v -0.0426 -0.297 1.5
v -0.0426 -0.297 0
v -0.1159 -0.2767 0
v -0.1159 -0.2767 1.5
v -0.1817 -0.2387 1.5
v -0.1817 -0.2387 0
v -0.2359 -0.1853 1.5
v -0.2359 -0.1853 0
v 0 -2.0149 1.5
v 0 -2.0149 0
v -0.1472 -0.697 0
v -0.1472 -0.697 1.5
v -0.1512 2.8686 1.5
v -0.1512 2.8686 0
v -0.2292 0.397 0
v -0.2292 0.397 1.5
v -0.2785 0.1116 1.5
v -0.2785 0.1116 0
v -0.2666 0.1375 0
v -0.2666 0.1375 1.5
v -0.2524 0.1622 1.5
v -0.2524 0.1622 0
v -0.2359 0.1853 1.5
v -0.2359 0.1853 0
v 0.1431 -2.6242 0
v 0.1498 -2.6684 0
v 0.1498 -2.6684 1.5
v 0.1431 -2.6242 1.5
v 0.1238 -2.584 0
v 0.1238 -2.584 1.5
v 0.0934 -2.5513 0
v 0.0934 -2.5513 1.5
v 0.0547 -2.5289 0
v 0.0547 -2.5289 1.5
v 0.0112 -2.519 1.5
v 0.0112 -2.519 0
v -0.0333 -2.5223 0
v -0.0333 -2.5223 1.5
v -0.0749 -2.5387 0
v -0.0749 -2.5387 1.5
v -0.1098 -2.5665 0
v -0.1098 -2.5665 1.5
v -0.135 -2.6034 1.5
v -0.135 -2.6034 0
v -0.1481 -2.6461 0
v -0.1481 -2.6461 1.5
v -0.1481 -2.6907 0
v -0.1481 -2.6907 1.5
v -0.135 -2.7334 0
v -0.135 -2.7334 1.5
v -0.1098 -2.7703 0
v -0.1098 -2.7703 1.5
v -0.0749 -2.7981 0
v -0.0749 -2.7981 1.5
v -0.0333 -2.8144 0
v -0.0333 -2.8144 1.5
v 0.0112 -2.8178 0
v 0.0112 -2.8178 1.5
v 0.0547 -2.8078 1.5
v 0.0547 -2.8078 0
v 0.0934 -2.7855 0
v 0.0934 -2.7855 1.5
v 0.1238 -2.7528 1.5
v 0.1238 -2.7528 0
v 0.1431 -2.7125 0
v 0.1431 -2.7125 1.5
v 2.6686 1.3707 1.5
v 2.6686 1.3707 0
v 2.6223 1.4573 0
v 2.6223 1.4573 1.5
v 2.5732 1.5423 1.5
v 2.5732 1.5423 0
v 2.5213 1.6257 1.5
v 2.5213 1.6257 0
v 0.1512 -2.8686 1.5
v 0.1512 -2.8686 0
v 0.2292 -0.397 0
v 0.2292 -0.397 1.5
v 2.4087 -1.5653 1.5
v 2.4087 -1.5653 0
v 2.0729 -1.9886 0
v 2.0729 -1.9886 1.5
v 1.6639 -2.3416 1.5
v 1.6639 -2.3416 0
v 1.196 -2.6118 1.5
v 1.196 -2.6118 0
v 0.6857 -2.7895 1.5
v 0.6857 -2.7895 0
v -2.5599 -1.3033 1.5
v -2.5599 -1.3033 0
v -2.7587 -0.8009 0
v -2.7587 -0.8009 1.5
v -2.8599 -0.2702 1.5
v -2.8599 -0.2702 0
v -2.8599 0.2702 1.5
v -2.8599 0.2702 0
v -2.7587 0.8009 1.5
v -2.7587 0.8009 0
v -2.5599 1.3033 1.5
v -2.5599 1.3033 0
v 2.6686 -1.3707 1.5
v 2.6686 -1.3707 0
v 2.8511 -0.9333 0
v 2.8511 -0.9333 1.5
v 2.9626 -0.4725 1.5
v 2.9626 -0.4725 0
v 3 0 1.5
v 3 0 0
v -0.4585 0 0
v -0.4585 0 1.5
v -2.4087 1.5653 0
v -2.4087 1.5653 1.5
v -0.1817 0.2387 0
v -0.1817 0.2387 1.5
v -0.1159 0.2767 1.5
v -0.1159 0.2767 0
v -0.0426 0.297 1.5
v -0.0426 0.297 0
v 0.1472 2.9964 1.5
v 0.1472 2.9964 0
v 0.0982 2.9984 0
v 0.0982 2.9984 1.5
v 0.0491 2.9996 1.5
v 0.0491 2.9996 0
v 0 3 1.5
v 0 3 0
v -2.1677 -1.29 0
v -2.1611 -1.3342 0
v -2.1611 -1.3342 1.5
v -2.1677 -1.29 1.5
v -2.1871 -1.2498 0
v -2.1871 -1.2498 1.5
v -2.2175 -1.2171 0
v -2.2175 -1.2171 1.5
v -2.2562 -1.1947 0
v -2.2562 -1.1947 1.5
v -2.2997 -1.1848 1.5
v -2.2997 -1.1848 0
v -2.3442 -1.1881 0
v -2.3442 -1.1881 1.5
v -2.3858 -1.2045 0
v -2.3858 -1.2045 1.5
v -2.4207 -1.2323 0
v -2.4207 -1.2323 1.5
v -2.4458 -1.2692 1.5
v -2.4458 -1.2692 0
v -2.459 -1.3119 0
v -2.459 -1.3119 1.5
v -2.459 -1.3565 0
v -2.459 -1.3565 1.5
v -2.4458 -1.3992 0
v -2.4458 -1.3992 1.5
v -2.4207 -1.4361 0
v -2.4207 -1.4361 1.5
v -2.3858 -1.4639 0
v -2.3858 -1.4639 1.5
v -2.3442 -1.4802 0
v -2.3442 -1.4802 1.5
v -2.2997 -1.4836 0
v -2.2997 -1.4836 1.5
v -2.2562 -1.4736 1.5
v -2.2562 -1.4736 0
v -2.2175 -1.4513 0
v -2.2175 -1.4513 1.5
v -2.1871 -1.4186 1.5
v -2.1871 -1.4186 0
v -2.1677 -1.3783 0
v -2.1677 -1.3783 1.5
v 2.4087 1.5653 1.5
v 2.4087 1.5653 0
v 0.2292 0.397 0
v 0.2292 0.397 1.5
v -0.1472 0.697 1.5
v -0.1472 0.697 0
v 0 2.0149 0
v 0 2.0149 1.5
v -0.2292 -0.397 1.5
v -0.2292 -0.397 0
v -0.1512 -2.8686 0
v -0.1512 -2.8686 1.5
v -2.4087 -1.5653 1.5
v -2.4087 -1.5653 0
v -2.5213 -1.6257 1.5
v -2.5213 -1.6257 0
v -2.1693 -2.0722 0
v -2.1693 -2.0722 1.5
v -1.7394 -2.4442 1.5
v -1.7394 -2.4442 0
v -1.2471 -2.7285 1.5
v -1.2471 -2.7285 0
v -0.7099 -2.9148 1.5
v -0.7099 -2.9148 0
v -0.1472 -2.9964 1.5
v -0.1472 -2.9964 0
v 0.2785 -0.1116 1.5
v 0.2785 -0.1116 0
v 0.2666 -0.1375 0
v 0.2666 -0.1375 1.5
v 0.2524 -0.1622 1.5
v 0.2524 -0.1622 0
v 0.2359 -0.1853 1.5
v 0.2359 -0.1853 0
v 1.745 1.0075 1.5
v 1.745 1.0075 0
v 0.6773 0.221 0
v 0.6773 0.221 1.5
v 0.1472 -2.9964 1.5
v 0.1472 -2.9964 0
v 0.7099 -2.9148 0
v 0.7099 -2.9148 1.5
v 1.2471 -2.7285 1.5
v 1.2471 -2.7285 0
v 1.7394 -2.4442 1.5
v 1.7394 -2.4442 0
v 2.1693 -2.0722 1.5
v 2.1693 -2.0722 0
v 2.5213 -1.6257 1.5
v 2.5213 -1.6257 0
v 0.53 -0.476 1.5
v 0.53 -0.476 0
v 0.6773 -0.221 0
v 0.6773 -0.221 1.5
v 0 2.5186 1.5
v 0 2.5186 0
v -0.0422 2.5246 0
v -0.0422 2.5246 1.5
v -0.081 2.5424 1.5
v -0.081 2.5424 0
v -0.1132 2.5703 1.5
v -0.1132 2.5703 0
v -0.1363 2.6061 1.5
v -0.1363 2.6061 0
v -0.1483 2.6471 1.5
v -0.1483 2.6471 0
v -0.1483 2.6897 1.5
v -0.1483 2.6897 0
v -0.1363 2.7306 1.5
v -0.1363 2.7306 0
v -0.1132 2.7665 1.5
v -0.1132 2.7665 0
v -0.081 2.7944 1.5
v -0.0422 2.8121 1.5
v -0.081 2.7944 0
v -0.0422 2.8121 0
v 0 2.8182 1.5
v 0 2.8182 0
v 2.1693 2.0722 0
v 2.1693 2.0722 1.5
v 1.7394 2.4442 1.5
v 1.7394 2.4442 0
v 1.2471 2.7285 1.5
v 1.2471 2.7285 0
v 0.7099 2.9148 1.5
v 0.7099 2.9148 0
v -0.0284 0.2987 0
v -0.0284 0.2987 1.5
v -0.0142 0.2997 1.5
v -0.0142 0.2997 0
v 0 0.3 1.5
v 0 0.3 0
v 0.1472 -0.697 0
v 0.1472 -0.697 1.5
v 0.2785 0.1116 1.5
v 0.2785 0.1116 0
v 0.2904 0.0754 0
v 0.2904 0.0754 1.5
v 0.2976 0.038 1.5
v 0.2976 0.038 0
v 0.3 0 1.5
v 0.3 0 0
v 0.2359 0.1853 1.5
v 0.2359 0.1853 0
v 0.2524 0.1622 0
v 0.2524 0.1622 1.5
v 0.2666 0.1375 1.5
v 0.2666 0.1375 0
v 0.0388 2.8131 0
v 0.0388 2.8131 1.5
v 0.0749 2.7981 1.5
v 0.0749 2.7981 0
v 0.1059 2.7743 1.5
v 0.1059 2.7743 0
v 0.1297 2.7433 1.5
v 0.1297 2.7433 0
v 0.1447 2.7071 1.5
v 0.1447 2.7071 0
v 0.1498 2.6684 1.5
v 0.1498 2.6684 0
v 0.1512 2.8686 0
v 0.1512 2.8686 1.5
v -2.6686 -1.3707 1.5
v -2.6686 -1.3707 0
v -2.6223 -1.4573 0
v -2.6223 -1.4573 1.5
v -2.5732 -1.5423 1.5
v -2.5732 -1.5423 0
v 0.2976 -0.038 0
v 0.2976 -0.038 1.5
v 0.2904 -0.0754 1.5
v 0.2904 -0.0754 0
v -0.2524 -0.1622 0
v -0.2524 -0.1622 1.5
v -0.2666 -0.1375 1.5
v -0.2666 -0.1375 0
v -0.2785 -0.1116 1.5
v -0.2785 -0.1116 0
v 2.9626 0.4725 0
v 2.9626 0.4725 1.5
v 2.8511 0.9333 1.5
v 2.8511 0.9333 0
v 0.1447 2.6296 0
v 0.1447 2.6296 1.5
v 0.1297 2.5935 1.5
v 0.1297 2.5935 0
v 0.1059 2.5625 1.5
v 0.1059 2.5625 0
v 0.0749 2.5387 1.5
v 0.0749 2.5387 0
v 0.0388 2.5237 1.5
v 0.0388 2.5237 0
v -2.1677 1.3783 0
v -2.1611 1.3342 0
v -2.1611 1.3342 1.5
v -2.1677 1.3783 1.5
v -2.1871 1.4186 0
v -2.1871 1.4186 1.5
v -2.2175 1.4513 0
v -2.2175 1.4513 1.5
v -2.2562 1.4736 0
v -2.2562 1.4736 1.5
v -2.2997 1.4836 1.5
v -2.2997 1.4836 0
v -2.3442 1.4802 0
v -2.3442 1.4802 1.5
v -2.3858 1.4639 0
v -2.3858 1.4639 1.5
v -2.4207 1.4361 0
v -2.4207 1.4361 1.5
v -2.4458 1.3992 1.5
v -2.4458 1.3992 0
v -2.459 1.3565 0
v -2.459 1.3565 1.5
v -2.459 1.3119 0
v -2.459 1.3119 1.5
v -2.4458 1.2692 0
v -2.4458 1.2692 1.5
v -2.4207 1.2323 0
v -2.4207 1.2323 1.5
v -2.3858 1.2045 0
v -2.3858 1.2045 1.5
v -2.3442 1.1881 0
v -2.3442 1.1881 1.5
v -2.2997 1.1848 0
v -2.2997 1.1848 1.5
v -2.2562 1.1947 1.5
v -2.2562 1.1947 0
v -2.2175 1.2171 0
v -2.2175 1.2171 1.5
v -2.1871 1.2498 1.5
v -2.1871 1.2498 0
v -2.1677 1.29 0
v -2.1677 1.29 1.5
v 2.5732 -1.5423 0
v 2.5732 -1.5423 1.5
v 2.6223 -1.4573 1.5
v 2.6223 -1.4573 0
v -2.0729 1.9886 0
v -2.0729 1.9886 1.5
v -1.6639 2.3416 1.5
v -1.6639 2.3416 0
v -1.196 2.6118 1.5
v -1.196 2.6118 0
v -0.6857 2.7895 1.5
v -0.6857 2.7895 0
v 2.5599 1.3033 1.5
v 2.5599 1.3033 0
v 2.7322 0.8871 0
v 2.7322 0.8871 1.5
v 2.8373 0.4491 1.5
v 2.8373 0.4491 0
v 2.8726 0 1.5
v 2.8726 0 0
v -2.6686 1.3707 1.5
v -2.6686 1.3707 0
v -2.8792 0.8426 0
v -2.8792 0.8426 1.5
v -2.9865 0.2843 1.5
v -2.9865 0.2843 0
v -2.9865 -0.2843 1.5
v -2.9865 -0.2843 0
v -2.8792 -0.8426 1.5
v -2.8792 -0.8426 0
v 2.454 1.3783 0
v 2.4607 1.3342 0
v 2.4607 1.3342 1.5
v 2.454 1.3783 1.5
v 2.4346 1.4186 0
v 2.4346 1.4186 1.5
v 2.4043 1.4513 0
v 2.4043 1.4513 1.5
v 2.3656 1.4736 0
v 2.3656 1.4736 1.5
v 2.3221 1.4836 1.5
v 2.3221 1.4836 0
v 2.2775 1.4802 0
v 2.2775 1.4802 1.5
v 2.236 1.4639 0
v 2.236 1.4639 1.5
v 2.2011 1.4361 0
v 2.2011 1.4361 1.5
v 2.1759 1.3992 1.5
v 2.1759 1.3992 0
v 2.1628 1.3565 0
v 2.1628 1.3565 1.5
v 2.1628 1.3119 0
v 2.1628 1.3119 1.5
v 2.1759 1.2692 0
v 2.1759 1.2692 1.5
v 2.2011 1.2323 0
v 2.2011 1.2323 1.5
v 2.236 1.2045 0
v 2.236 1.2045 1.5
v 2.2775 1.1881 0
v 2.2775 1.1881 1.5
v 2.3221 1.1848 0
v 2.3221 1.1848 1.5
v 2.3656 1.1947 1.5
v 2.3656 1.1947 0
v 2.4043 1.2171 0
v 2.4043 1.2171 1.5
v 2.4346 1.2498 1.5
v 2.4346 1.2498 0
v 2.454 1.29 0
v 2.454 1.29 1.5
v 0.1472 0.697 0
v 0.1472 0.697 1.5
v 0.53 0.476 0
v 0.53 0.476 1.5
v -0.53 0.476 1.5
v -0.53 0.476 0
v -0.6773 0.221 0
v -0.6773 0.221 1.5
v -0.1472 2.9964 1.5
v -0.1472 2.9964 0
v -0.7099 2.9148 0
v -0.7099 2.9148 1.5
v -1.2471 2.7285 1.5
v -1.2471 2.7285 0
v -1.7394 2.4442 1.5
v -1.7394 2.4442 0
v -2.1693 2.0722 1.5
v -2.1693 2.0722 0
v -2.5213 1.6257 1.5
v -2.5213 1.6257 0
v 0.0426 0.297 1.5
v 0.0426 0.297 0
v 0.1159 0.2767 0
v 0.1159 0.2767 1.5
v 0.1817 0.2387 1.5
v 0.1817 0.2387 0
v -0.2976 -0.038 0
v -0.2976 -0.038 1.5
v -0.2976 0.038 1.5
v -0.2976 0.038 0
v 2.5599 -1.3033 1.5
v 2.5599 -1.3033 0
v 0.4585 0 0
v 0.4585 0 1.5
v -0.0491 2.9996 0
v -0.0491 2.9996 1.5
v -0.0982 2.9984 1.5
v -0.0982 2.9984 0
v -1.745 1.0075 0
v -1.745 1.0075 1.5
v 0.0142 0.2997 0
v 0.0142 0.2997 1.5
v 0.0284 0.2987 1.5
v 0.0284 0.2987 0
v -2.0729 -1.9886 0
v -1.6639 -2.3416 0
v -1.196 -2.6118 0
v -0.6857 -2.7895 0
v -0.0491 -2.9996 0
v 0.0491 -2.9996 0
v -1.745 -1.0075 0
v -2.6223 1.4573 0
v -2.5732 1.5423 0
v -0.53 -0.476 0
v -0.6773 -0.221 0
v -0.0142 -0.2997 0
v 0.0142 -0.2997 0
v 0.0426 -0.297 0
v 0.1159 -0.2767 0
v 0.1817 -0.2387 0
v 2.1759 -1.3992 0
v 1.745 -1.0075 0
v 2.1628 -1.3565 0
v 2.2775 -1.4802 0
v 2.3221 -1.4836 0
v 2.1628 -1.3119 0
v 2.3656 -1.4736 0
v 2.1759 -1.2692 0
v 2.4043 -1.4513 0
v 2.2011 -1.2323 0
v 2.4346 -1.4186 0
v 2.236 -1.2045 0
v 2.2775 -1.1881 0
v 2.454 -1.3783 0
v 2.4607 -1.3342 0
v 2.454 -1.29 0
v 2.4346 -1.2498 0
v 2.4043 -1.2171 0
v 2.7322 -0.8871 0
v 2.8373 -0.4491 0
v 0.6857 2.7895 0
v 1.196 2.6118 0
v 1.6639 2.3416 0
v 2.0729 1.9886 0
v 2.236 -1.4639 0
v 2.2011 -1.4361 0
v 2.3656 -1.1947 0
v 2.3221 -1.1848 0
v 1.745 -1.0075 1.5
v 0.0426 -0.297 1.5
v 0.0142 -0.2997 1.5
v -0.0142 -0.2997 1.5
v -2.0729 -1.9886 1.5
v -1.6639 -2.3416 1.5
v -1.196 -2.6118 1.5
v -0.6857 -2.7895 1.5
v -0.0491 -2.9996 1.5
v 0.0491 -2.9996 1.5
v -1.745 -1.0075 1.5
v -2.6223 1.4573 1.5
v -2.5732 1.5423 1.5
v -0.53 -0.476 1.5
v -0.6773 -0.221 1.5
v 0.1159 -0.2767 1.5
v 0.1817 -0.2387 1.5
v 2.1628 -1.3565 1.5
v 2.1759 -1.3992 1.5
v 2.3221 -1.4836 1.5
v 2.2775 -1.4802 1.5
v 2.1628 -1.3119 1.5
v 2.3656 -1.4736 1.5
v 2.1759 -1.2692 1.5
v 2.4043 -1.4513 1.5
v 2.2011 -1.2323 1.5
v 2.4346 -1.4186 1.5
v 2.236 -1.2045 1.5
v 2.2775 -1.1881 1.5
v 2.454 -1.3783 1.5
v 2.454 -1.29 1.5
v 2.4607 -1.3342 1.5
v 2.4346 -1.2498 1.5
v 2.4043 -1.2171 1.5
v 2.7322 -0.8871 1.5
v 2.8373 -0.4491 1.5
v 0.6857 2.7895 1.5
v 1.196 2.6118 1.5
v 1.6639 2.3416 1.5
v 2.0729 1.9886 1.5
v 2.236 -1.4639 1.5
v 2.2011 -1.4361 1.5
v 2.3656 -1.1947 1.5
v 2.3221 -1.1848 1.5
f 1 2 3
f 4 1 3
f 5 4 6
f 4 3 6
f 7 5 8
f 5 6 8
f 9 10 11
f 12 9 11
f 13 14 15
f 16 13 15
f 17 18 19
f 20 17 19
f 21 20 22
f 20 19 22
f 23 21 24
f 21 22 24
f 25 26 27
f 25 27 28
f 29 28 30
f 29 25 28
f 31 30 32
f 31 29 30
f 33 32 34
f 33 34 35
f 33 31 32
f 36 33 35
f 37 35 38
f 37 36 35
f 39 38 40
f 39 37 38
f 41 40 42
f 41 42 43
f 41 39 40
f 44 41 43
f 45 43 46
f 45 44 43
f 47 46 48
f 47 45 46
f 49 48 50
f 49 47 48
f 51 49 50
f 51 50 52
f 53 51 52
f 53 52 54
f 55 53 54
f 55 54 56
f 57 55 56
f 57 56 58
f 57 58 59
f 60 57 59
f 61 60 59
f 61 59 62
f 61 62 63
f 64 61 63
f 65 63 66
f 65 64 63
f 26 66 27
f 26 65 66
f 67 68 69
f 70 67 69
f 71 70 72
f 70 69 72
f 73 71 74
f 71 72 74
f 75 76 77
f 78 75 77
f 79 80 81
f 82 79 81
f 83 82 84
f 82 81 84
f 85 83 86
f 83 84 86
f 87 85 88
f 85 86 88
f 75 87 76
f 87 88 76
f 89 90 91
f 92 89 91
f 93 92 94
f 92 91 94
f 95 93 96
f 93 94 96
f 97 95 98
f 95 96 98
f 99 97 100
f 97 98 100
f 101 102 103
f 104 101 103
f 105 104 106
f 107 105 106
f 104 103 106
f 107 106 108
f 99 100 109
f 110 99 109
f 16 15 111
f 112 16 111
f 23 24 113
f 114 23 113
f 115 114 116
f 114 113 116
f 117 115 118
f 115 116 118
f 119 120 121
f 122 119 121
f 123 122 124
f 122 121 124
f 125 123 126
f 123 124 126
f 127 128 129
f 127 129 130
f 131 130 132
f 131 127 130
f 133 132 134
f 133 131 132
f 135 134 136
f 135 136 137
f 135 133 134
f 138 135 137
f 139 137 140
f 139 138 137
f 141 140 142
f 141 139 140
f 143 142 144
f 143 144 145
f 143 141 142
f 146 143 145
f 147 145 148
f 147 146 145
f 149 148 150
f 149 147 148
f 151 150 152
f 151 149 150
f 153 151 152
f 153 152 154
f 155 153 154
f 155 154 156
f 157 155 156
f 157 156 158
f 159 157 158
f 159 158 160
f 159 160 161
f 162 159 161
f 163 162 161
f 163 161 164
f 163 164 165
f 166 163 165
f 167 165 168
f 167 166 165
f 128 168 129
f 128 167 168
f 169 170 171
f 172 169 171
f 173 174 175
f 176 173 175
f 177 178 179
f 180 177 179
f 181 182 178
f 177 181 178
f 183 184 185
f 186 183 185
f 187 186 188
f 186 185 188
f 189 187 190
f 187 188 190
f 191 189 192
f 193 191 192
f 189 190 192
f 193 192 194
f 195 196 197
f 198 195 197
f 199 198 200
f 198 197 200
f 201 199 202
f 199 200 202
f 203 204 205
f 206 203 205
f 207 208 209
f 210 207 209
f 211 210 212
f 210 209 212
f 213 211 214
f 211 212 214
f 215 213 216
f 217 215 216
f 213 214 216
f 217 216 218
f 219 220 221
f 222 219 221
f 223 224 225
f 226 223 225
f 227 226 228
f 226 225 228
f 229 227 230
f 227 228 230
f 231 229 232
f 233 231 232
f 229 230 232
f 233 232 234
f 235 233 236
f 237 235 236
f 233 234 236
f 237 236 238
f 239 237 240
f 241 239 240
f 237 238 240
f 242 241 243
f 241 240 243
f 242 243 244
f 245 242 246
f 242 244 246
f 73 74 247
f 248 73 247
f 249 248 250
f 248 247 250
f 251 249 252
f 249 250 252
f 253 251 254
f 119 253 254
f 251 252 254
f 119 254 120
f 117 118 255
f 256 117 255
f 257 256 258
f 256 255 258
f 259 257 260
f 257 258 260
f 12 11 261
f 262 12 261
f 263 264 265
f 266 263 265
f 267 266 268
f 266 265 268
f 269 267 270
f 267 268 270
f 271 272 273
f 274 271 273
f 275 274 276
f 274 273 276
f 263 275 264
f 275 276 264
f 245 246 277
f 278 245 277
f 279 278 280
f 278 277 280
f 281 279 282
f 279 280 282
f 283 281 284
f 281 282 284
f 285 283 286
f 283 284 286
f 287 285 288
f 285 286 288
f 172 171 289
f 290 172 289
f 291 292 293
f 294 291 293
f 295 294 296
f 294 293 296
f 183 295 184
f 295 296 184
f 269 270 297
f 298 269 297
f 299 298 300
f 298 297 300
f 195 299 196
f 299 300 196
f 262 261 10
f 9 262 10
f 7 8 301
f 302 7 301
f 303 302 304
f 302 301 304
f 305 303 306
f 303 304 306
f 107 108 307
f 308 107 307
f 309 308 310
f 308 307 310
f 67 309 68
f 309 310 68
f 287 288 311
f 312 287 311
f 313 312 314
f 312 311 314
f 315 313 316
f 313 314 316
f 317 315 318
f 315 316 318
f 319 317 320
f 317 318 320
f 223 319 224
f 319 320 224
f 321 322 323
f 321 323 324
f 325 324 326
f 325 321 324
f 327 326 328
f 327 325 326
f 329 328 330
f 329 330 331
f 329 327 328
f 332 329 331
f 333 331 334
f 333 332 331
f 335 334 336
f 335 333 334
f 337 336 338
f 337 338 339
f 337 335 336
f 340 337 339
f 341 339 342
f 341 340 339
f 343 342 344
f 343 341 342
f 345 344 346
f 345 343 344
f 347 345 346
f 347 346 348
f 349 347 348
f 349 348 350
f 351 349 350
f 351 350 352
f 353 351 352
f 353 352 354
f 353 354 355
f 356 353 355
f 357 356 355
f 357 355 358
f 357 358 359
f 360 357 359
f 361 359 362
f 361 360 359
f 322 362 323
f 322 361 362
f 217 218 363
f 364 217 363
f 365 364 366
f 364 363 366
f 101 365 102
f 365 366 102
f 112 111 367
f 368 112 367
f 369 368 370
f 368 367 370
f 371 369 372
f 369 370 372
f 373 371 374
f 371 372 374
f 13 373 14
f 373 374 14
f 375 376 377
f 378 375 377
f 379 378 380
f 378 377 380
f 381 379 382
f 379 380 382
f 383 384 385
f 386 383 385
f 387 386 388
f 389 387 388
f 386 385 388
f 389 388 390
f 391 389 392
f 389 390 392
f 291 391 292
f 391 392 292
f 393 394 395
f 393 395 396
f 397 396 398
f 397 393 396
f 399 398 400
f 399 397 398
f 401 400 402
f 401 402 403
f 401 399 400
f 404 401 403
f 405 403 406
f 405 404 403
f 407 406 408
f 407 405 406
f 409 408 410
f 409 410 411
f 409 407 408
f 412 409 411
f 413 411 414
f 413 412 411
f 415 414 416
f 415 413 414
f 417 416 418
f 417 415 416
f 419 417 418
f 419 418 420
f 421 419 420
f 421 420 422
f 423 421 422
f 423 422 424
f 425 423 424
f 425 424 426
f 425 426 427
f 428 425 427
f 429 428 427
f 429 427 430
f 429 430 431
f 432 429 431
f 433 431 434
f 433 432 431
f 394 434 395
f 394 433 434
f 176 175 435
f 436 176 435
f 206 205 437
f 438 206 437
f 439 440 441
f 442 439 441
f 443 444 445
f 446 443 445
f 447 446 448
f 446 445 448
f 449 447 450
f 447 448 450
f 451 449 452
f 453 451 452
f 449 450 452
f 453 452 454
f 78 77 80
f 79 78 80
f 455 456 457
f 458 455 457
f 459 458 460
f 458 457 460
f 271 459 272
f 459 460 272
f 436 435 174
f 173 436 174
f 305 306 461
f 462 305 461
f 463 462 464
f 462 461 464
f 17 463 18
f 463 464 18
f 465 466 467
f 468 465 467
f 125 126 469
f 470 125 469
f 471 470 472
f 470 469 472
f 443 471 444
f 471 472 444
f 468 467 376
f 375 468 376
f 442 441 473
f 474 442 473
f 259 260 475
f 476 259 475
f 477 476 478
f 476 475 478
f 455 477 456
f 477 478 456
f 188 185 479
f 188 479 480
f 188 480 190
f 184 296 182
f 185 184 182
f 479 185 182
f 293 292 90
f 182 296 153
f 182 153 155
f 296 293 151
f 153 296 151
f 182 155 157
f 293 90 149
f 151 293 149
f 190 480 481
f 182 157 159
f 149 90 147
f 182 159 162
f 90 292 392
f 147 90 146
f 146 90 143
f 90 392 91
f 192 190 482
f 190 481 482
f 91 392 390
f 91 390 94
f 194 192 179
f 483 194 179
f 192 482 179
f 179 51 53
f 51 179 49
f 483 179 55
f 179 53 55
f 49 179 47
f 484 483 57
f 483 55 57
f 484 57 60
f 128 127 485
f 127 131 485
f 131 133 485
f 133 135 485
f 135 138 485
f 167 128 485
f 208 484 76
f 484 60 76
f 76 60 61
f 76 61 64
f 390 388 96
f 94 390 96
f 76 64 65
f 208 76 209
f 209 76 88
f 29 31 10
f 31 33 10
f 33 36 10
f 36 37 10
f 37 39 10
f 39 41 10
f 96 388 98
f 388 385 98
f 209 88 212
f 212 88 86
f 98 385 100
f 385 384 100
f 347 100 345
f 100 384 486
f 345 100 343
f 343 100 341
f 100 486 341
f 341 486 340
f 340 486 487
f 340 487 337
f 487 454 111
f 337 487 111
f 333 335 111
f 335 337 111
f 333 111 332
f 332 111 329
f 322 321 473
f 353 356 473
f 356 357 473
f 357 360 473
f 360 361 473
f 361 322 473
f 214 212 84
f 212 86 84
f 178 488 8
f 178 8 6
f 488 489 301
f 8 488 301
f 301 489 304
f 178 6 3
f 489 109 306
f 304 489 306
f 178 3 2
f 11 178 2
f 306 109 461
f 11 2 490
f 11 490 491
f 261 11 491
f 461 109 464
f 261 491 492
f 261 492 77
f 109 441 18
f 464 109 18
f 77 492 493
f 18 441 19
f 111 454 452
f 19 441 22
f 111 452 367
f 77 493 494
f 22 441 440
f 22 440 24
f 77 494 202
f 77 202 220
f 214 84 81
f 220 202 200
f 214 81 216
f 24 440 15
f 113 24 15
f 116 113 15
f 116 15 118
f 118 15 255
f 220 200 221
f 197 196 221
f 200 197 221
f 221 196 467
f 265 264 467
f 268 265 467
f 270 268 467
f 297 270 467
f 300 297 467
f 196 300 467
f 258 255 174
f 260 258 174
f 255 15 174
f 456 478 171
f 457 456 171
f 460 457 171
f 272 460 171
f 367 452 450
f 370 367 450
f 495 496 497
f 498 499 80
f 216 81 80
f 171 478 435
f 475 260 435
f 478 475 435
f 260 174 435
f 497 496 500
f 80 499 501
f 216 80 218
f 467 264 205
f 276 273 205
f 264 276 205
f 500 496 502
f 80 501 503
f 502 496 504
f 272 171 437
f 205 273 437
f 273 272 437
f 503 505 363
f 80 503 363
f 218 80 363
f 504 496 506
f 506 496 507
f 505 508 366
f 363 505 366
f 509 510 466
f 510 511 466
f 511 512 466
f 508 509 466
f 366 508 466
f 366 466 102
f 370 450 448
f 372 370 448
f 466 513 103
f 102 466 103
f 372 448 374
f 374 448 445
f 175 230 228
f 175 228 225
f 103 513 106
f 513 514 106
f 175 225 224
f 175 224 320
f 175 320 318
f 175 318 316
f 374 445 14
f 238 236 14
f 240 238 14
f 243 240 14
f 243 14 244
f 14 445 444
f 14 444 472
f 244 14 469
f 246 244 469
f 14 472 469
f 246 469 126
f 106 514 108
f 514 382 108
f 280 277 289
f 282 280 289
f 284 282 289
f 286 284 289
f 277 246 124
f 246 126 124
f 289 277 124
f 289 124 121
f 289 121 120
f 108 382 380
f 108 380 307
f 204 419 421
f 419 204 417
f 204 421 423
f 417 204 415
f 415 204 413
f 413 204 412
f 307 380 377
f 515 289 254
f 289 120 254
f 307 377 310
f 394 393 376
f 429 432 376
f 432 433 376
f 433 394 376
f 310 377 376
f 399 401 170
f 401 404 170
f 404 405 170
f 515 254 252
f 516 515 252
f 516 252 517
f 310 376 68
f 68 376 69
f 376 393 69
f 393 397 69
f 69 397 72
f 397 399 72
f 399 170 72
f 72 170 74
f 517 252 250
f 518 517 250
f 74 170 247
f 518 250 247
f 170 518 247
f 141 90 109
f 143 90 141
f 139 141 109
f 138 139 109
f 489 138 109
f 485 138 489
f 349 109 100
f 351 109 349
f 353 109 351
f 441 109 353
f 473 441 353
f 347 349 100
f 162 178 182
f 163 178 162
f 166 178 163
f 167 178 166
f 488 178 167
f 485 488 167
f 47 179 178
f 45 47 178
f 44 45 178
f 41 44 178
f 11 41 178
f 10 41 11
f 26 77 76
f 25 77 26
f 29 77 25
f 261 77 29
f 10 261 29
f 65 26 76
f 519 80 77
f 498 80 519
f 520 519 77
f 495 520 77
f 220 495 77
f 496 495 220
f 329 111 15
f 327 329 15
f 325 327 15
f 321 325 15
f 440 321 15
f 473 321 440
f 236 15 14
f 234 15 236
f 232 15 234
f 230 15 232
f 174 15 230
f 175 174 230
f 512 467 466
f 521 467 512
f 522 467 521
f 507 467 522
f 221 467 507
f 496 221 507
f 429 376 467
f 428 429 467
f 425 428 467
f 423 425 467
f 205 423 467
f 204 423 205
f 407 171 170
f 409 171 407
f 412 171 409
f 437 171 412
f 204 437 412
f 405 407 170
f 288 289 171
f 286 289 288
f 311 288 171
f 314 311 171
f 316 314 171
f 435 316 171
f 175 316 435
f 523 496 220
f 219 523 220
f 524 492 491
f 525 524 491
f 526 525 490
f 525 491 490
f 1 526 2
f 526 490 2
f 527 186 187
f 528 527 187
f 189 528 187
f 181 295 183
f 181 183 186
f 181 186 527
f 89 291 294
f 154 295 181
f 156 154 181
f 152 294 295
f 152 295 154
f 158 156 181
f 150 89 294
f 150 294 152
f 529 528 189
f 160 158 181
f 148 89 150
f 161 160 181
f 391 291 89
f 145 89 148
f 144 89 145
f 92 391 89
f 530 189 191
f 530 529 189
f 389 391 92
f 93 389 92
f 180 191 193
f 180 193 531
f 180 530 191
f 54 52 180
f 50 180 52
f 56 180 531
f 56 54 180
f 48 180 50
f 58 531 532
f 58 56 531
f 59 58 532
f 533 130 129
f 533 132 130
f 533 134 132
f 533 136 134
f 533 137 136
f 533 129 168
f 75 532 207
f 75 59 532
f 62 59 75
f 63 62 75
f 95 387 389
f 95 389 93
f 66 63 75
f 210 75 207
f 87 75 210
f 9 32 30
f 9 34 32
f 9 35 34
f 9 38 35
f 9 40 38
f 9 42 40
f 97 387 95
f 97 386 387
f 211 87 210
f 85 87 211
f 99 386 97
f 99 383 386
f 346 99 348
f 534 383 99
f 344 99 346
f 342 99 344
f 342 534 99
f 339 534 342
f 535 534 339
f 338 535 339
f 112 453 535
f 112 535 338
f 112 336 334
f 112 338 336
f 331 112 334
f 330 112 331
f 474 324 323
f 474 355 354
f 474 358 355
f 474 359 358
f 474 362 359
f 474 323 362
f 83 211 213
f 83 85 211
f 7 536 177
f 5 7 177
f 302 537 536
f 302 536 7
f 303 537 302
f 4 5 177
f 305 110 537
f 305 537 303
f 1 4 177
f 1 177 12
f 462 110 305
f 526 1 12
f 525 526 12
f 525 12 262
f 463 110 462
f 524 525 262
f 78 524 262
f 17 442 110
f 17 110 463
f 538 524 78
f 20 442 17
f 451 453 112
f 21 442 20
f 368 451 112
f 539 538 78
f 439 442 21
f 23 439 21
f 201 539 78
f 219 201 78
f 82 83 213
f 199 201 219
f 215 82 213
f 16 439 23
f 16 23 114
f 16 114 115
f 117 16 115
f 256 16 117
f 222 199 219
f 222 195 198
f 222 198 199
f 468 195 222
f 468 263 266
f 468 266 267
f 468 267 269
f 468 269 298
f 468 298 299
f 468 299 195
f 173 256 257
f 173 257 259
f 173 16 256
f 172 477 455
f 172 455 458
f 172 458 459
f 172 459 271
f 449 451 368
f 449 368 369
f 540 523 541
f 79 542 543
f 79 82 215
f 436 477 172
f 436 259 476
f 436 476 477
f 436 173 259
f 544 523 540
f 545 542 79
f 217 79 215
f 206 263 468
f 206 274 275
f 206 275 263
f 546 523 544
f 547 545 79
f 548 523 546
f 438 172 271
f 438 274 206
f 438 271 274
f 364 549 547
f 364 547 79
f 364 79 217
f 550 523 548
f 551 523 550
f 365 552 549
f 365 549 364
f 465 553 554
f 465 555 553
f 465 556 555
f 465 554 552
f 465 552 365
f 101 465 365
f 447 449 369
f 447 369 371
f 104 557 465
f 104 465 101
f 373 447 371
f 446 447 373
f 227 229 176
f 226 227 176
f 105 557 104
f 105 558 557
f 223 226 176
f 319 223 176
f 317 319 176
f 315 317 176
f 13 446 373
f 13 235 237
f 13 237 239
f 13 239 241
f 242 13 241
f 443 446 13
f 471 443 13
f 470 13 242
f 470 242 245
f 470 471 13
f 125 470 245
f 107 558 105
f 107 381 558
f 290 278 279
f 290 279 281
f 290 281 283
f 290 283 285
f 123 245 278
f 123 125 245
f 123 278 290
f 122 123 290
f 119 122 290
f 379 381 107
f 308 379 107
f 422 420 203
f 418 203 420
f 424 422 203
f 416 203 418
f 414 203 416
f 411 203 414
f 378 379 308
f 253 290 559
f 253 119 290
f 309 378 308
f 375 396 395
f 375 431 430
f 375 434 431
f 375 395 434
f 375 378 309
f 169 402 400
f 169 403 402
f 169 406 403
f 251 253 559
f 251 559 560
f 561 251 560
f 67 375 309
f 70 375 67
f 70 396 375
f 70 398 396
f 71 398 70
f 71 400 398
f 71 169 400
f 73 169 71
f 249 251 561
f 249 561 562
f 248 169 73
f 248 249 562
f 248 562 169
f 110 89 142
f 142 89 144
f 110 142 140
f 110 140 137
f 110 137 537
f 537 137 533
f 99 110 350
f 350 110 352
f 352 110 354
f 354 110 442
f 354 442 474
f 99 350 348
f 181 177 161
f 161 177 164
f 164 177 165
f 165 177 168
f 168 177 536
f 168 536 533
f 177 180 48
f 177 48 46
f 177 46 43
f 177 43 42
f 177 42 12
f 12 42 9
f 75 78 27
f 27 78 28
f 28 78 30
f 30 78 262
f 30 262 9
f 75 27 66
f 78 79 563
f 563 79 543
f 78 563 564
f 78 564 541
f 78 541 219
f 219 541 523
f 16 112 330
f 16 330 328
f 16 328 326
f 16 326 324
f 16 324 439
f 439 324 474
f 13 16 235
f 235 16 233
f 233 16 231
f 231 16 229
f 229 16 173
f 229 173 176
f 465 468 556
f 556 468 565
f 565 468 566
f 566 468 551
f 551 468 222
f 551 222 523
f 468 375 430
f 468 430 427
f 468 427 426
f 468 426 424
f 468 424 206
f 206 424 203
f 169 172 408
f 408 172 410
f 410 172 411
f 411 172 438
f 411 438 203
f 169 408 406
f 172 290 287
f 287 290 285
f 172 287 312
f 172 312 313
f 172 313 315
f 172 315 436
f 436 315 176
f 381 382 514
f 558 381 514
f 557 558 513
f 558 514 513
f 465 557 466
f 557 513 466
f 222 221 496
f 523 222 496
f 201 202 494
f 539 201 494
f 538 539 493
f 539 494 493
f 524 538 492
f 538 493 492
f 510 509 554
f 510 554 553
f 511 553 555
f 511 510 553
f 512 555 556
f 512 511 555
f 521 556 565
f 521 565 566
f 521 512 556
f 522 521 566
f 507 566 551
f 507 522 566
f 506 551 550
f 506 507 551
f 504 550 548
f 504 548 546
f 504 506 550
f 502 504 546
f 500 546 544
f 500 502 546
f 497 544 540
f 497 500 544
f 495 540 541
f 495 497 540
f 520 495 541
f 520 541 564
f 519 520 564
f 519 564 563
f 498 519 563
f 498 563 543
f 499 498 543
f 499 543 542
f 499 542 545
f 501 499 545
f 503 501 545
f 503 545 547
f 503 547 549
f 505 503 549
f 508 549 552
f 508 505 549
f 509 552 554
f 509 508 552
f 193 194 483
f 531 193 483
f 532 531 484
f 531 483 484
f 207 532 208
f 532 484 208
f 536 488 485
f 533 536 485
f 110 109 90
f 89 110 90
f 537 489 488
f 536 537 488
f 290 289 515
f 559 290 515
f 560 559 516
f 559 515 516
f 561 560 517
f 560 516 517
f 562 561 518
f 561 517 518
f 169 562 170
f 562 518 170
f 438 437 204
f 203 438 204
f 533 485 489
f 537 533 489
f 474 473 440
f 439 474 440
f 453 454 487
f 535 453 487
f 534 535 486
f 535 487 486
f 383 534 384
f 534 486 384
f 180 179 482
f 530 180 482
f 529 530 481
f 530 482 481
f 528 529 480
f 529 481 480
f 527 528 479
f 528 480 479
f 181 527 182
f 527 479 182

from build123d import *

# Parameters (mm, degrees)
SKETCH1_R           = 0.14979499
BOSS_EXTRUDE1_DEPTH = 1.5


with BuildPart() as part:
    # Sketch1 → Boss-Extrude1 (new body)
    # profile 1 of 26: a face of its own
    with BuildSketch(Plane.XY):
        with BuildLine():
            Line((-0.151247724, 2.868610652), (-0.147216387, 2.996385712))
            ThreePointArc((-0.147216387, 2.996385712), (-1.5, 2.598076211), (-2.521337953, 1.625685987))
            Line((-2.521337953, 1.625685987), (-2.408665836, 1.565289697))
            ThreePointArc((-2.408665836, 1.565289697), (-1.436297579, 2.487740382), (-0.151247724, 2.868610652))
        make_face()
    # profile 2 of 26: a face of its own
    with BuildSketch(Plane.XY):
        with BuildLine():
            Line((0, 2.872595159), (0, 3))
            ThreePointArc((0, 3), (-0.073630374, 2.999096292), (-0.147216387, 2.996385712))
            Line((-0.147216387, 2.996385712), (-0.151247724, 2.868610652))
            ThreePointArc((-0.151247724, 2.868610652), (-0.0756501, 2.871598859), (0, 2.872595159))
        make_face()
    # profile 3 of 26: a face of its own
    with BuildSketch(Plane.XY):
        with BuildLine():
            ThreePointArc((0.147216387, 2.996385712), (0.073630374, 2.999096292), (0, 3))
            Line((0, 3), (0, 2.872595159))
            ThreePointArc((0, 2.872595159), (0.0756501, 2.871598859), (0.151247724, 2.868610652))
            Line((0.151247724, 2.868610652), (0.147216387, 2.996385712))
        make_face()
    # profile 4 of 26: a face of its own
    with BuildSketch(Plane.XY):
        with BuildLine():
            ThreePointArc((2.521337953, 1.625685987), (1.5, 2.598076211), (0.147216387, 2.996385712))
            Line((0.147216387, 2.996385712), (0.151247724, 2.868610652))
            ThreePointArc((0.151247724, 2.868610652), (1.436297579, 2.487740382), (2.408665836, 1.565289697))
            Line((2.408665836, 1.565289697), (2.521337953, 1.625685987))
        make_face()
    # profile 5 of 26: a face of its own
    with BuildSketch(Plane.XY):
        with BuildLine():
            ThreePointArc((0.147216387, -2.996385712), (1.5, -2.598076211), (2.521337953, -1.625685987))
            Line((2.521337953, -1.625685987), (2.408665836, -1.565289697))
            ThreePointArc((2.408665836, -1.565289697), (1.436297579, -2.487740382), (0.151247724, -2.868610652))
            Line((0.151247724, -2.868610652), (0.147216387, -2.996385712))
        make_face()
    # profile 6 of 26: a face of its own
    with BuildSketch(Plane.XY):
        with BuildLine():
            ThreePointArc((2.521337953, -1.625685987), (2.598076211, -1.5), (2.66855434, -1.370699725))
            Line((2.66855434, -1.370699725), (2.55991356, -1.303320955))
            ThreePointArc((2.55991356, -1.303320955), (2.487740382, -1.436297579), (2.408665836, -1.565289697))
            Line((2.408665836, -1.565289697), (2.521337953, -1.625685987))
        make_face()
    # profile 7 of 26: a face of its own
    with BuildSketch(Plane.XY):
        with BuildLine():
            ThreePointArc((3, 0), (2.915961507, 0.705101759), (2.66855434, 1.370699725))
            Line((2.66855434, 1.370699725), (2.55991356, 1.303320955))
            ThreePointArc((2.55991356, 1.303320955), (2.793331187, 0.67015209), (2.872595159, 0))
            ThreePointArc((2.872595159, 0), (2.793331187, -0.67015209), (2.55991356, -1.303320955))
            Line((2.55991356, -1.303320955), (2.66855434, -1.370699725))
            ThreePointArc((2.66855434, -1.370699725), (2.915961507, -0.705101759), (3, 0))
        make_face()
    # profile 8 of 26: a face of its own
    with BuildSketch(Plane.XY):
        with BuildLine():
            Line((-2.408665836, -1.565289697), (-2.521337953, -1.625685987))
            ThreePointArc((-2.521337953, -1.625685987), (-1.5, -2.598076211), (-0.147216387, -2.996385712))
            Line((-0.147216387, -2.996385712), (-0.151247724, -2.868610652))
            ThreePointArc((-0.151247724, -2.868610652), (-1.436297579, -2.487740382), (-2.408665836, -1.565289697))
        make_face()
    # profile 9 of 26: a face of its own
    with BuildSketch(Plane.XY):
        with BuildLine():
            Line((-0.151247724, -2.868610652), (-0.147216387, -2.996385712))
            ThreePointArc((-0.147216387, -2.996385712), (0, -3), (0.147216387, -2.996385712))
            Line((0.147216387, -2.996385712), (0.151247724, -2.868610652))
            ThreePointArc((0.151247724, -2.868610652), (0, -2.872595159), (-0.151247724, -2.868610652))
        make_face()
    # profile 10 of 26: a face of its own
    with BuildSketch(Plane.XY):
        with BuildLine():
            Line((-2.55991356, -1.303320955), (-2.66855434, -1.370699725))
            ThreePointArc((-2.66855434, -1.370699725), (-2.598076211, -1.5), (-2.521337953, -1.625685987))
            Line((-2.521337953, -1.625685987), (-2.408665836, -1.565289697))
            ThreePointArc((-2.408665836, -1.565289697), (-2.487740382, -1.436297579), (-2.55991356, -1.303320955))
        make_face()
    # profile 11 of 26: a face of its own
    with BuildSketch(Plane.XY):
        with BuildLine():
            Line((-2.55991356, 1.303320955), (-2.66855434, 1.370699725))
            ThreePointArc((-2.66855434, 1.370699725), (-3, 0), (-2.66855434, -1.370699725))
            Line((-2.66855434, -1.370699725), (-2.55991356, -1.303320955))
            ThreePointArc((-2.55991356, -1.303320955), (-2.872595159, 0), (-2.55991356, 1.303320955))
        make_face()
    # profile 12 of 26: a face of its own
    with BuildSketch(Plane.XY):
        with BuildLine():
            ThreePointArc((2.66855434, 1.370699725), (2.598076211, 1.5), (2.521337953, 1.625685987))
            Line((2.521337953, 1.625685987), (2.408665836, 1.565289697))
            ThreePointArc((2.408665836, 1.565289697), (2.487740382, 1.436297579), (2.55991356, 1.303320955))
            Line((2.55991356, 1.303320955), (2.66855434, 1.370699725))
        make_face()
    # profile 13 of 26: a face of its own
    with BuildSketch(Plane.XY):
        with BuildLine():
            Line((-2.408665836, 1.565289697), (-2.521337953, 1.625685987))
            ThreePointArc((-2.521337953, 1.625685987), (-2.598076211, 1.5), (-2.66855434, 1.370699725))
            Line((-2.66855434, 1.370699725), (-2.55991356, 1.303320955))
            ThreePointArc((-2.55991356, 1.303320955), (-2.487740382, 1.436297579), (-2.408665836, 1.565289697))
        make_face()
    # profile 14 of 26: a face of its own
    with BuildSketch(Plane.XY):
        with BuildLine():
            Line((-0.235905833, 0.185333316), (-0.229226676, 0.397032249))
            Line((-0.229226676, 0.397032249), (-2.408665836, 1.565289697))
            ThreePointArc((-2.408665836, 1.565289697), (-2.487740382, 1.436297579), (-2.55991356, 1.303320955))
            Line((-2.55991356, 1.303320955), (-0.458453352, 0))
            Line((-0.458453352, 0), (-0.278456276, 0.111633786))
            ThreePointArc((-0.278456276, 0.111633786), (-0.259807621, 0.15), (-0.235905833, 0.185333316))
        make_face()
        with Locations((-2.31088182, 1.334188241)):
            Circle(SKETCH1_R, mode=Mode.SUBTRACT)
        Polygon((-0.530042873, 0.476011237), (-0.677259261, 0.221024975), (-1.744995763, 1.007473773), align=None, mode=Mode.SUBTRACT)
    # profile 15 of 26: a face of its own
    with BuildSketch(Plane.XY):
        with BuildLine():
            Line((-0.278456276, -0.111633786), (-0.458453352, 0))
            Line((-0.458453352, 0), (-2.55991356, -1.303320955))
            ThreePointArc((-2.55991356, -1.303320955), (-2.487740382, -1.436297579), (-2.408665836, -1.565289697))
            Line((-2.408665836, -1.565289697), (-0.229226676, -0.397032249))
            Line((-0.229226676, -0.397032249), (-0.235905833, -0.185333316))
            ThreePointArc((-0.235905833, -0.185333316), (-0.259807621, -0.15), (-0.278456276, -0.111633786))
        make_face()
        with Locations((-2.31088182, -1.334188241)):
            Circle(SKETCH1_R, mode=Mode.SUBTRACT)
        Polygon((-0.677259261, -0.221024975), (-0.530042873, -0.476011237), (-1.744995763, -1.007473773), align=None, mode=Mode.SUBTRACT)
    # profile 16 of 26: a face of its own
    with BuildSketch(Plane.XY):
        with BuildLine():
            ThreePointArc((-0.278456276, -0.111633786), (-0.3, 0), (-0.278456276, 0.111633786))
            Line((-0.278456276, 0.111633786), (-0.458453352, 0))
            Line((-0.458453352, 0), (-0.278456276, -0.111633786))
        make_face()
    # profile 17 of 26: a face of its own
    with BuildSketch(Plane.XY):
        with BuildLine():
            Line((-0.042550443, 0.296967102), (-0.229226676, 0.397032249))
            Line((-0.229226676, 0.397032249), (-0.235905833, 0.185333316))
            ThreePointArc((-0.235905833, 0.185333316), (-0.15, 0.259807621), (-0.042550443, 0.296967102))
        make_face()
    # profile 18 of 26: a face of its own
    with BuildSketch(Plane.XY):
        with BuildLine():
            ThreePointArc((0.151247724, 2.868610652), (0.0756501, 2.871598859), (0, 2.872595159))
            Line((0, 2.872595159), (0, 2.818171471))
            ThreePointArc((0, 2.818171471), (0.105921053, 2.774297535), (0.14979499, 2.668376482))
            ThreePointArc((0.14979499, 2.668376482), (0.105921053, 2.562455429), (0, 2.518581492))
            Line((0, 2.518581492), (0, 2.014947547))
            Line((0, 2.014947547), (0.147216387, 0.697036212))
            Line((0.147216387, 0.697036212), (0, 0.697036212))
            Line((0, 0.697036212), (0, 0.3))
            ThreePointArc((0, 0.3), (0.021329198, 0.299240815), (0.042550443, 0.296967102))
            Line((0.042550443, 0.296967102), (0.229226676, 0.397032249))
            Line((0.229226676, 0.397032249), (0.151247724, 2.868610652))
        make_face()
    # profile 19 of 26: a face of its own
    with BuildSketch(Plane.XY):
        with BuildLine():
            Line((0, 2.818171471), (0, 2.872595159))
            ThreePointArc((0, 2.872595159), (-0.0756501, 2.871598859), (-0.151247724, 2.868610652))
            Line((-0.151247724, 2.868610652), (-0.229226676, 0.397032249))
            Line((-0.229226676, 0.397032249), (-0.042550443, 0.296967102))
            ThreePointArc((-0.042550443, 0.296967102), (-0.021329198, 0.299240815), (0, 0.3))
            Line((0, 0.3), (0, 0.697036212))
            Line((0, 0.697036212), (-0.147216387, 0.697036212))
            Line((-0.147216387, 0.697036212), (0, 2.014947547))
            Line((0, 2.014947547), (0, 2.518581492))
            ThreePointArc((0, 2.518581492), (-0.14979499, 2.668376482), (0, 2.818171471))
        make_face()
    # profile 20 of 26: a face of its own
    with BuildSketch(Plane.XY):
        with BuildLine():
            Line((0.235905833, 0.185333316), (0.229226676, 0.397032249))
            Line((0.229226676, 0.397032249), (0.042550443, 0.296967102))
            ThreePointArc((0.042550443, 0.296967102), (0.15, 0.259807621), (0.235905833, 0.185333316))
        make_face()
    # profile 21 of 26: a face of its own
    with BuildSketch(Plane.XY):
        with BuildLine():
            Line((2.408665836, 1.565289697), (0.229226676, 0.397032249))
            Line((0.229226676, 0.397032249), (0.235905833, 0.185333316))
            ThreePointArc((0.235905833, 0.185333316), (0.259807621, 0.15), (0.278456276, 0.111633786))
            Line((0.278456276, 0.111633786), (0.458453352, 0))
            Line((0.458453352, 0), (2.55991356, 1.303320955))
            ThreePointArc((2.55991356, 1.303320955), (2.487740382, 1.436297579), (2.408665836, 1.565289697))
        make_face()
        Polygon((0.677259261, 0.221024975), (0.530042873, 0.476011237), (1.744995763, 1.007473773), align=None, mode=Mode.SUBTRACT)
        with Locations((2.31088182, 1.334188241)):
            Circle(SKETCH1_R, mode=Mode.SUBTRACT)
    # profile 22 of 26: a face of its own
    with BuildSketch(Plane.XY):
        with BuildLine():
            Line((0.458453352, 0), (0.278456276, 0.111633786))
            ThreePointArc((0.278456276, 0.111633786), (0.294564834, 0.056846799), (0.3, 0))
            ThreePointArc((0.3, 0), (0.294564834, -0.056846799), (0.278456276, -0.111633786))
            Line((0.278456276, -0.111633786), (0.458453352, 0))
        make_face()
    # profile 23 of 26: a face of its own
    with BuildSketch(Plane.XY):
        with BuildLine():
            Line((2.55991356, -1.303320955), (0.458453352, 0))
            Line((0.458453352, 0), (0.278456276, -0.111633786))
            ThreePointArc((0.278456276, -0.111633786), (0.259807621, -0.15), (0.235905833, -0.185333316))
            Line((0.235905833, -0.185333316), (0.229226676, -0.397032249))
            Line((0.229226676, -0.397032249), (2.408665836, -1.565289697))
            ThreePointArc((2.408665836, -1.565289697), (2.487740382, -1.436297579), (2.55991356, -1.303320955))
        make_face()
        Polygon((0.530042873, -0.476011237), (0.677259261, -0.221024975), (1.744995763, -1.007473773), align=None, mode=Mode.SUBTRACT)
        with Locations((2.31088182, -1.334188241)):
            Circle(SKETCH1_R, mode=Mode.SUBTRACT)
    # profile 24 of 26: a face of its own
    with BuildSketch(Plane.XY):
        with BuildLine():
            Line((0.229226676, -0.397032249), (0.235905833, -0.185333316))
            ThreePointArc((0.235905833, -0.185333316), (0.15, -0.259807621), (0.042550443, -0.296967102))
            Line((0.042550443, -0.296967102), (0.229226676, -0.397032249))
        make_face()
    # profile 25 of 26: a face of its own
    with BuildSketch(Plane.XY):
        with BuildLine():
            Line((-0.042550443, -0.296967102), (-0.229226676, -0.397032249))
            Line((-0.229226676, -0.397032249), (-0.151247724, -2.868610652))
            ThreePointArc((-0.151247724, -2.868610652), (0, -2.872595159), (0.151247724, -2.868610652))
            Line((0.151247724, -2.868610652), (0.229226676, -0.397032249))
            Line((0.229226676, -0.397032249), (0.042550443, -0.296967102))
            ThreePointArc((0.042550443, -0.296967102), (0, -0.3), (-0.042550443, -0.296967102))
        make_face()
        with Locations((0, -2.668376482)):
            Circle(SKETCH1_R, mode=Mode.SUBTRACT)
        Polygon((-0.147216387, -0.697036212), (0.147216387, -0.697036212), (0, -2.014947547), align=None, mode=Mode.SUBTRACT)
    # profile 26 of 26: a face of its own
    with BuildSketch(Plane.XY):
        with BuildLine():
            ThreePointArc((-0.042550443, -0.296967102), (-0.15, -0.259807621), (-0.235905833, -0.185333316))
            Line((-0.235905833, -0.185333316), (-0.229226676, -0.397032249))
            Line((-0.229226676, -0.397032249), (-0.042550443, -0.296967102))
        make_face()
    extrude(amount=BOSS_EXTRUDE1_DEPTH)


solid = part.part
